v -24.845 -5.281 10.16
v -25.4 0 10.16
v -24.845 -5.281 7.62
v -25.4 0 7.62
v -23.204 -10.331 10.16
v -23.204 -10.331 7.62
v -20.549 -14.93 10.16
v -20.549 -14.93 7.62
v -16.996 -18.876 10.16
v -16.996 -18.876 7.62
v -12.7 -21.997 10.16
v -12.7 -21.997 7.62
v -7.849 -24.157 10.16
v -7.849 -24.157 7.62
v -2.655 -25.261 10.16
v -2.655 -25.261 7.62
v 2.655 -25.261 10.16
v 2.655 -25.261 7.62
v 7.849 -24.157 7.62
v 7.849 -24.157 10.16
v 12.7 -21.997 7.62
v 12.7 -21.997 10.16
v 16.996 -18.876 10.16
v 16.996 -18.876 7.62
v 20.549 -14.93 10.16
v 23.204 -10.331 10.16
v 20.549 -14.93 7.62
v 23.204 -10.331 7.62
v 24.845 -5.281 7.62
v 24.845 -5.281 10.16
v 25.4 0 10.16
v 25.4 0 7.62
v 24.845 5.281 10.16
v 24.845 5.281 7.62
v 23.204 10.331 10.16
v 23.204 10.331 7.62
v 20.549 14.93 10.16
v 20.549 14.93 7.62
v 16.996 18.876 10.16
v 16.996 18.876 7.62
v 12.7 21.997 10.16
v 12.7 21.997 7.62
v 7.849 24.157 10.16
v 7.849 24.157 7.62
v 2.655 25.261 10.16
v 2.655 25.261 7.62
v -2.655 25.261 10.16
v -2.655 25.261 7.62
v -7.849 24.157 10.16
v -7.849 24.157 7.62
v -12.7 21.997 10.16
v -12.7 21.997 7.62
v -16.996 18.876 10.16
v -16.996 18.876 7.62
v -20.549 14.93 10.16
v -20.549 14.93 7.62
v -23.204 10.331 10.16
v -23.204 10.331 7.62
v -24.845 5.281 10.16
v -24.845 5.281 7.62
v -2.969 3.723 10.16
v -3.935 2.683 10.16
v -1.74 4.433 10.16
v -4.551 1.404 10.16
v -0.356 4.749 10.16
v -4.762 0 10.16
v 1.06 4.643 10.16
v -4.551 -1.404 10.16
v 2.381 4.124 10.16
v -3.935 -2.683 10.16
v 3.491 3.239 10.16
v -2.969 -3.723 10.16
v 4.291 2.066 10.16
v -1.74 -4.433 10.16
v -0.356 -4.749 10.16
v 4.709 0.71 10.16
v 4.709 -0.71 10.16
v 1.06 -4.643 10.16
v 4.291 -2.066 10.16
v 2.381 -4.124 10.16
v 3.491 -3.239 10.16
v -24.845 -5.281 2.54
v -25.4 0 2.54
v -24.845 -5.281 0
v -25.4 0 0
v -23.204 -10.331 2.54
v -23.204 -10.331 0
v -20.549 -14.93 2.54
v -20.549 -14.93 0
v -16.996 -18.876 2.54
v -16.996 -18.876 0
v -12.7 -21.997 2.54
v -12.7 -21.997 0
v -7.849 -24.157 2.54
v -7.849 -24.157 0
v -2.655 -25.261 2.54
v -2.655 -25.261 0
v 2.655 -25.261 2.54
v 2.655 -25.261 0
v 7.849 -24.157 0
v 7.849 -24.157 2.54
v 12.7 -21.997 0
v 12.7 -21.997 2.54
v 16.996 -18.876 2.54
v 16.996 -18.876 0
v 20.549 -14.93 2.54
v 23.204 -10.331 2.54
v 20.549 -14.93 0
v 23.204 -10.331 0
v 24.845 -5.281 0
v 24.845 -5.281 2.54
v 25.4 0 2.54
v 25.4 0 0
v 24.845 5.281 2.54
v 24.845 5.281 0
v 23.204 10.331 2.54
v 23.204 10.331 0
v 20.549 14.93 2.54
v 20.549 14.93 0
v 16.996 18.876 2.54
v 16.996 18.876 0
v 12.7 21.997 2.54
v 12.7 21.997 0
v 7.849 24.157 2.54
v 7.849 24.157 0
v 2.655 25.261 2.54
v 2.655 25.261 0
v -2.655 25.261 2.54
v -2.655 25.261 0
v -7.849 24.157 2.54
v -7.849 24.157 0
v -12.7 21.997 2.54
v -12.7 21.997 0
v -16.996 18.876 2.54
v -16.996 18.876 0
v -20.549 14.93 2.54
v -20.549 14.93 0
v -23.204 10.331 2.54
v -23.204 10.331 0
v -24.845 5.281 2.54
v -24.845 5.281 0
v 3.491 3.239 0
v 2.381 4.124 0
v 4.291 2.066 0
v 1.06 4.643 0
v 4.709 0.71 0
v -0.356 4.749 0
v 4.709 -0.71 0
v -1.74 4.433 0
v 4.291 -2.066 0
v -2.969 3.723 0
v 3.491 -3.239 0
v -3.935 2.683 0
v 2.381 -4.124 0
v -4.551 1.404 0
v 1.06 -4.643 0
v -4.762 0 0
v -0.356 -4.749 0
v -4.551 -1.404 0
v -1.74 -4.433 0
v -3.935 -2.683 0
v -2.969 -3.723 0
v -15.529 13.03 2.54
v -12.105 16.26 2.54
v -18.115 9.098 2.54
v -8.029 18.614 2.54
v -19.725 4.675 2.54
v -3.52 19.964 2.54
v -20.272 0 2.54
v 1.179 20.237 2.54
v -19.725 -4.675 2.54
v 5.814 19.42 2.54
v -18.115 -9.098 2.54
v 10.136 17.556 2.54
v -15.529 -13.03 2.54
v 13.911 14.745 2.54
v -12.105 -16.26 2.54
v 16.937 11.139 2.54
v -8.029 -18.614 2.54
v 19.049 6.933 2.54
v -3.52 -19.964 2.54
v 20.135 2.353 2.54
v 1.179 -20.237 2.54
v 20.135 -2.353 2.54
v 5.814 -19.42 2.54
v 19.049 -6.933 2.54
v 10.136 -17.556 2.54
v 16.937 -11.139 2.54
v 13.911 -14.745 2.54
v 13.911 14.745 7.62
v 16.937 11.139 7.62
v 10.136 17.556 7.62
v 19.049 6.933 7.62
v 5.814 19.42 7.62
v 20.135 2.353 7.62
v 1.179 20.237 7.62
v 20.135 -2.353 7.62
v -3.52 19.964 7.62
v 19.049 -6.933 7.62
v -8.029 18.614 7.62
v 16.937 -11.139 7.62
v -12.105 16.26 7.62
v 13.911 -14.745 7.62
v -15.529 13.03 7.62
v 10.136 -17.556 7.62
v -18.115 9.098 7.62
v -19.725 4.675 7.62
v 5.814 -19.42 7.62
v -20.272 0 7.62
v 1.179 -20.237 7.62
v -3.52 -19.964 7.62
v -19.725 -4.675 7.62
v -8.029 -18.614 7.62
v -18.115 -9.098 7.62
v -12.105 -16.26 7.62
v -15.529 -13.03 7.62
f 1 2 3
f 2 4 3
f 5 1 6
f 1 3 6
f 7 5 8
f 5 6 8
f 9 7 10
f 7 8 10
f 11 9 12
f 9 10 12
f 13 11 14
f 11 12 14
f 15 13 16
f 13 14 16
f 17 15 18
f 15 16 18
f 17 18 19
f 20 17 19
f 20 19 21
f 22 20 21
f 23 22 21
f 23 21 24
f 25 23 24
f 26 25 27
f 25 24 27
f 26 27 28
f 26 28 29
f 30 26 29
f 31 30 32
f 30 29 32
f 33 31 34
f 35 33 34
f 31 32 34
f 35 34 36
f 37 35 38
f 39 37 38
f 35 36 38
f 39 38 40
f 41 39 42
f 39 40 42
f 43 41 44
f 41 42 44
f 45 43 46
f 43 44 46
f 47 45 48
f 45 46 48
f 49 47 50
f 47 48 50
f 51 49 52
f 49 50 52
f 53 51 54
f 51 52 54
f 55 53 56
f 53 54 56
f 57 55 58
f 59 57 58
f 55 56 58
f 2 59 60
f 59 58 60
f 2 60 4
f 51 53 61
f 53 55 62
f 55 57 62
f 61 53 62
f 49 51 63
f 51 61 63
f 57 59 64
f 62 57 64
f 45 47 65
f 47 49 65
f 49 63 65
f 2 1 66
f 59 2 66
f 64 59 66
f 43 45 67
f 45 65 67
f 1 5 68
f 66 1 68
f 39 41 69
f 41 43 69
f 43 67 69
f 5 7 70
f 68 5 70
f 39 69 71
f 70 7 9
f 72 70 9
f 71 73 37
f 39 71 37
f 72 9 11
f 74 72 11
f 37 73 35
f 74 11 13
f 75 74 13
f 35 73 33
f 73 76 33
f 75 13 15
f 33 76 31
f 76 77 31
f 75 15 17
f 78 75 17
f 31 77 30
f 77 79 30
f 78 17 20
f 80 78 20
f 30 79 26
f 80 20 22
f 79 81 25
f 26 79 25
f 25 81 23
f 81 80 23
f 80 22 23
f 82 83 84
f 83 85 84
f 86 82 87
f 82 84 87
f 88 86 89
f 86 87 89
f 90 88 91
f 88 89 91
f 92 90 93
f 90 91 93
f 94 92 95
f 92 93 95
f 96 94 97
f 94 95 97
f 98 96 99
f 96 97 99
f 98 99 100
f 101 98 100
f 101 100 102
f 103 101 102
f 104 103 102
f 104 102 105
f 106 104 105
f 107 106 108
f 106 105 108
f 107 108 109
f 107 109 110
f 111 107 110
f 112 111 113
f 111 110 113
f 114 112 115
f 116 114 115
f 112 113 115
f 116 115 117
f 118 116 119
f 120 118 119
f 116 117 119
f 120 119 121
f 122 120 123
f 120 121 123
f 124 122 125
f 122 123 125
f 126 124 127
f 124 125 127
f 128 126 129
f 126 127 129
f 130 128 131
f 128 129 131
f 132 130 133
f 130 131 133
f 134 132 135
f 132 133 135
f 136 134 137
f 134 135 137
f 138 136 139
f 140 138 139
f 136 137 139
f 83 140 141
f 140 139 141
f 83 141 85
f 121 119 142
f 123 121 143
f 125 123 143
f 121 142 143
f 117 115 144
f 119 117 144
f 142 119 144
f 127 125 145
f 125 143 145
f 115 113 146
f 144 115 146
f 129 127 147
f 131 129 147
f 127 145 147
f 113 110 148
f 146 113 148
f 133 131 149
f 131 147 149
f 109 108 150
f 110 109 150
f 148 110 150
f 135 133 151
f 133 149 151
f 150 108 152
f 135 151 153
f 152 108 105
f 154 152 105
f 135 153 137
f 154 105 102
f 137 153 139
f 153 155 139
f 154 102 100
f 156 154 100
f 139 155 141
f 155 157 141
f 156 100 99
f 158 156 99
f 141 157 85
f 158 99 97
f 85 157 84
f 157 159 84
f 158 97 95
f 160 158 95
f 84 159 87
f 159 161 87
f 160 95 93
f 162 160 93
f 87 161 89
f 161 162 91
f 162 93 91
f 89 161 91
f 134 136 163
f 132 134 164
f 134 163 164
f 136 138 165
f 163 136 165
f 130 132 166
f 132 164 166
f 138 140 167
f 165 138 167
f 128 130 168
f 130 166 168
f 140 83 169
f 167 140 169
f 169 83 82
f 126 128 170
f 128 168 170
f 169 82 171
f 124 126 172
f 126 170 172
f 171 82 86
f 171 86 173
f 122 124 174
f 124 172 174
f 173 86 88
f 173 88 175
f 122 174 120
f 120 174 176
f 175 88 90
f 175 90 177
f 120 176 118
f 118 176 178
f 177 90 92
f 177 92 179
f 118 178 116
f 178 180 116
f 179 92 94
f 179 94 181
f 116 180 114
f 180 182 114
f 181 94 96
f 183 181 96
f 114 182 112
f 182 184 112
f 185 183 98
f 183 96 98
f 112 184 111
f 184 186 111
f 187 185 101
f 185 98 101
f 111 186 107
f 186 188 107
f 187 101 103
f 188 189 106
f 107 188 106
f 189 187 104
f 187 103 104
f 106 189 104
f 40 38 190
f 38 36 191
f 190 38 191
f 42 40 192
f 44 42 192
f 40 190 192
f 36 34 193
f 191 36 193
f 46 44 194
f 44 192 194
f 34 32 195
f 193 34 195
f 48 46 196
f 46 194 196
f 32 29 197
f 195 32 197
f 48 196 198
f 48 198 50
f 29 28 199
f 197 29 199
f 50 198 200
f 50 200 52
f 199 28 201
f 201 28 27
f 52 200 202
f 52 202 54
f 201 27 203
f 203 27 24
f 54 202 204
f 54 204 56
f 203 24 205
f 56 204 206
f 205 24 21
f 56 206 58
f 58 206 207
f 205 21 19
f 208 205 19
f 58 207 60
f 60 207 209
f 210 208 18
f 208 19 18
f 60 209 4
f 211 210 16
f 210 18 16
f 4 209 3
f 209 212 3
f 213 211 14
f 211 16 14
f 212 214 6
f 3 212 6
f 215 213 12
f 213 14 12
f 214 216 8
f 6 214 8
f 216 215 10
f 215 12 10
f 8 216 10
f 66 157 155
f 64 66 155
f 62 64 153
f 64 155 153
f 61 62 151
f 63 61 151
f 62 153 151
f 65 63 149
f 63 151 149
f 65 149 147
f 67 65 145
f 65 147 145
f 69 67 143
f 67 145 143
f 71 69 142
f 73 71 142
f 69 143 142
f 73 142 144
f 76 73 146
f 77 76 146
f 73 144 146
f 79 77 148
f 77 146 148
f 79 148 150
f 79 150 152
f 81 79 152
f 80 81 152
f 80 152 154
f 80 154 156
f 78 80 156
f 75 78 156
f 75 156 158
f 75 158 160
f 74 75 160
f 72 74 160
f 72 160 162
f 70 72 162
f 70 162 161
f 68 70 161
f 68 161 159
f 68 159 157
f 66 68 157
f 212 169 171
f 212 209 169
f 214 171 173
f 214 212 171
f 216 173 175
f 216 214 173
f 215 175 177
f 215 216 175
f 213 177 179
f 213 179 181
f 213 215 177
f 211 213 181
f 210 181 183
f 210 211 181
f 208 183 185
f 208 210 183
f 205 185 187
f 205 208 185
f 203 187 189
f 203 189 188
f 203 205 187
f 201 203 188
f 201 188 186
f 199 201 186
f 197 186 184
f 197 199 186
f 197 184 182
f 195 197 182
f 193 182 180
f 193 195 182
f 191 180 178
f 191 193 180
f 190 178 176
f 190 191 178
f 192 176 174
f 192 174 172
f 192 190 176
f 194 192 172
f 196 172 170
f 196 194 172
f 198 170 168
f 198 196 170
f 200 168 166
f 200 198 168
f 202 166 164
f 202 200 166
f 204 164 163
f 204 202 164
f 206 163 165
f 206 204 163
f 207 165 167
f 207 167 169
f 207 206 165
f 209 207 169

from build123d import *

# Parameters (mm, degrees)
F0_W     = 20.271596
F0_H     = 5.08
F3_D     = 9.525
F3_DEPTH = 50.8


with BuildPart() as f1:
    # F0 (on Front) → F1 (revolve)
    with BuildSketch(Plane.XZ):
        with Locations((-10.135798, 5.08)):
            Rectangle(F0_W, F0_H)
        Polygon((-20.271596, 7.62), (0, 7.62), (0, 10.16), (-25.4, 10.16), (-25.4, 7.62), align=None)
        Polygon((-25.4, 0), (0, 0), (0, 2.54), (-20.271596, 2.54), (-25.4, 2.54), align=None)
    revolve(axis=Axis((0, 0, 5.08), (0, 0, 1)))

    # F3
    with Locations(Plane.XY.offset(10.16)):
        with Locations((0, 0)):
            Hole(F3_D / 2, depth=F3_DEPTH)


solid = f1.part
